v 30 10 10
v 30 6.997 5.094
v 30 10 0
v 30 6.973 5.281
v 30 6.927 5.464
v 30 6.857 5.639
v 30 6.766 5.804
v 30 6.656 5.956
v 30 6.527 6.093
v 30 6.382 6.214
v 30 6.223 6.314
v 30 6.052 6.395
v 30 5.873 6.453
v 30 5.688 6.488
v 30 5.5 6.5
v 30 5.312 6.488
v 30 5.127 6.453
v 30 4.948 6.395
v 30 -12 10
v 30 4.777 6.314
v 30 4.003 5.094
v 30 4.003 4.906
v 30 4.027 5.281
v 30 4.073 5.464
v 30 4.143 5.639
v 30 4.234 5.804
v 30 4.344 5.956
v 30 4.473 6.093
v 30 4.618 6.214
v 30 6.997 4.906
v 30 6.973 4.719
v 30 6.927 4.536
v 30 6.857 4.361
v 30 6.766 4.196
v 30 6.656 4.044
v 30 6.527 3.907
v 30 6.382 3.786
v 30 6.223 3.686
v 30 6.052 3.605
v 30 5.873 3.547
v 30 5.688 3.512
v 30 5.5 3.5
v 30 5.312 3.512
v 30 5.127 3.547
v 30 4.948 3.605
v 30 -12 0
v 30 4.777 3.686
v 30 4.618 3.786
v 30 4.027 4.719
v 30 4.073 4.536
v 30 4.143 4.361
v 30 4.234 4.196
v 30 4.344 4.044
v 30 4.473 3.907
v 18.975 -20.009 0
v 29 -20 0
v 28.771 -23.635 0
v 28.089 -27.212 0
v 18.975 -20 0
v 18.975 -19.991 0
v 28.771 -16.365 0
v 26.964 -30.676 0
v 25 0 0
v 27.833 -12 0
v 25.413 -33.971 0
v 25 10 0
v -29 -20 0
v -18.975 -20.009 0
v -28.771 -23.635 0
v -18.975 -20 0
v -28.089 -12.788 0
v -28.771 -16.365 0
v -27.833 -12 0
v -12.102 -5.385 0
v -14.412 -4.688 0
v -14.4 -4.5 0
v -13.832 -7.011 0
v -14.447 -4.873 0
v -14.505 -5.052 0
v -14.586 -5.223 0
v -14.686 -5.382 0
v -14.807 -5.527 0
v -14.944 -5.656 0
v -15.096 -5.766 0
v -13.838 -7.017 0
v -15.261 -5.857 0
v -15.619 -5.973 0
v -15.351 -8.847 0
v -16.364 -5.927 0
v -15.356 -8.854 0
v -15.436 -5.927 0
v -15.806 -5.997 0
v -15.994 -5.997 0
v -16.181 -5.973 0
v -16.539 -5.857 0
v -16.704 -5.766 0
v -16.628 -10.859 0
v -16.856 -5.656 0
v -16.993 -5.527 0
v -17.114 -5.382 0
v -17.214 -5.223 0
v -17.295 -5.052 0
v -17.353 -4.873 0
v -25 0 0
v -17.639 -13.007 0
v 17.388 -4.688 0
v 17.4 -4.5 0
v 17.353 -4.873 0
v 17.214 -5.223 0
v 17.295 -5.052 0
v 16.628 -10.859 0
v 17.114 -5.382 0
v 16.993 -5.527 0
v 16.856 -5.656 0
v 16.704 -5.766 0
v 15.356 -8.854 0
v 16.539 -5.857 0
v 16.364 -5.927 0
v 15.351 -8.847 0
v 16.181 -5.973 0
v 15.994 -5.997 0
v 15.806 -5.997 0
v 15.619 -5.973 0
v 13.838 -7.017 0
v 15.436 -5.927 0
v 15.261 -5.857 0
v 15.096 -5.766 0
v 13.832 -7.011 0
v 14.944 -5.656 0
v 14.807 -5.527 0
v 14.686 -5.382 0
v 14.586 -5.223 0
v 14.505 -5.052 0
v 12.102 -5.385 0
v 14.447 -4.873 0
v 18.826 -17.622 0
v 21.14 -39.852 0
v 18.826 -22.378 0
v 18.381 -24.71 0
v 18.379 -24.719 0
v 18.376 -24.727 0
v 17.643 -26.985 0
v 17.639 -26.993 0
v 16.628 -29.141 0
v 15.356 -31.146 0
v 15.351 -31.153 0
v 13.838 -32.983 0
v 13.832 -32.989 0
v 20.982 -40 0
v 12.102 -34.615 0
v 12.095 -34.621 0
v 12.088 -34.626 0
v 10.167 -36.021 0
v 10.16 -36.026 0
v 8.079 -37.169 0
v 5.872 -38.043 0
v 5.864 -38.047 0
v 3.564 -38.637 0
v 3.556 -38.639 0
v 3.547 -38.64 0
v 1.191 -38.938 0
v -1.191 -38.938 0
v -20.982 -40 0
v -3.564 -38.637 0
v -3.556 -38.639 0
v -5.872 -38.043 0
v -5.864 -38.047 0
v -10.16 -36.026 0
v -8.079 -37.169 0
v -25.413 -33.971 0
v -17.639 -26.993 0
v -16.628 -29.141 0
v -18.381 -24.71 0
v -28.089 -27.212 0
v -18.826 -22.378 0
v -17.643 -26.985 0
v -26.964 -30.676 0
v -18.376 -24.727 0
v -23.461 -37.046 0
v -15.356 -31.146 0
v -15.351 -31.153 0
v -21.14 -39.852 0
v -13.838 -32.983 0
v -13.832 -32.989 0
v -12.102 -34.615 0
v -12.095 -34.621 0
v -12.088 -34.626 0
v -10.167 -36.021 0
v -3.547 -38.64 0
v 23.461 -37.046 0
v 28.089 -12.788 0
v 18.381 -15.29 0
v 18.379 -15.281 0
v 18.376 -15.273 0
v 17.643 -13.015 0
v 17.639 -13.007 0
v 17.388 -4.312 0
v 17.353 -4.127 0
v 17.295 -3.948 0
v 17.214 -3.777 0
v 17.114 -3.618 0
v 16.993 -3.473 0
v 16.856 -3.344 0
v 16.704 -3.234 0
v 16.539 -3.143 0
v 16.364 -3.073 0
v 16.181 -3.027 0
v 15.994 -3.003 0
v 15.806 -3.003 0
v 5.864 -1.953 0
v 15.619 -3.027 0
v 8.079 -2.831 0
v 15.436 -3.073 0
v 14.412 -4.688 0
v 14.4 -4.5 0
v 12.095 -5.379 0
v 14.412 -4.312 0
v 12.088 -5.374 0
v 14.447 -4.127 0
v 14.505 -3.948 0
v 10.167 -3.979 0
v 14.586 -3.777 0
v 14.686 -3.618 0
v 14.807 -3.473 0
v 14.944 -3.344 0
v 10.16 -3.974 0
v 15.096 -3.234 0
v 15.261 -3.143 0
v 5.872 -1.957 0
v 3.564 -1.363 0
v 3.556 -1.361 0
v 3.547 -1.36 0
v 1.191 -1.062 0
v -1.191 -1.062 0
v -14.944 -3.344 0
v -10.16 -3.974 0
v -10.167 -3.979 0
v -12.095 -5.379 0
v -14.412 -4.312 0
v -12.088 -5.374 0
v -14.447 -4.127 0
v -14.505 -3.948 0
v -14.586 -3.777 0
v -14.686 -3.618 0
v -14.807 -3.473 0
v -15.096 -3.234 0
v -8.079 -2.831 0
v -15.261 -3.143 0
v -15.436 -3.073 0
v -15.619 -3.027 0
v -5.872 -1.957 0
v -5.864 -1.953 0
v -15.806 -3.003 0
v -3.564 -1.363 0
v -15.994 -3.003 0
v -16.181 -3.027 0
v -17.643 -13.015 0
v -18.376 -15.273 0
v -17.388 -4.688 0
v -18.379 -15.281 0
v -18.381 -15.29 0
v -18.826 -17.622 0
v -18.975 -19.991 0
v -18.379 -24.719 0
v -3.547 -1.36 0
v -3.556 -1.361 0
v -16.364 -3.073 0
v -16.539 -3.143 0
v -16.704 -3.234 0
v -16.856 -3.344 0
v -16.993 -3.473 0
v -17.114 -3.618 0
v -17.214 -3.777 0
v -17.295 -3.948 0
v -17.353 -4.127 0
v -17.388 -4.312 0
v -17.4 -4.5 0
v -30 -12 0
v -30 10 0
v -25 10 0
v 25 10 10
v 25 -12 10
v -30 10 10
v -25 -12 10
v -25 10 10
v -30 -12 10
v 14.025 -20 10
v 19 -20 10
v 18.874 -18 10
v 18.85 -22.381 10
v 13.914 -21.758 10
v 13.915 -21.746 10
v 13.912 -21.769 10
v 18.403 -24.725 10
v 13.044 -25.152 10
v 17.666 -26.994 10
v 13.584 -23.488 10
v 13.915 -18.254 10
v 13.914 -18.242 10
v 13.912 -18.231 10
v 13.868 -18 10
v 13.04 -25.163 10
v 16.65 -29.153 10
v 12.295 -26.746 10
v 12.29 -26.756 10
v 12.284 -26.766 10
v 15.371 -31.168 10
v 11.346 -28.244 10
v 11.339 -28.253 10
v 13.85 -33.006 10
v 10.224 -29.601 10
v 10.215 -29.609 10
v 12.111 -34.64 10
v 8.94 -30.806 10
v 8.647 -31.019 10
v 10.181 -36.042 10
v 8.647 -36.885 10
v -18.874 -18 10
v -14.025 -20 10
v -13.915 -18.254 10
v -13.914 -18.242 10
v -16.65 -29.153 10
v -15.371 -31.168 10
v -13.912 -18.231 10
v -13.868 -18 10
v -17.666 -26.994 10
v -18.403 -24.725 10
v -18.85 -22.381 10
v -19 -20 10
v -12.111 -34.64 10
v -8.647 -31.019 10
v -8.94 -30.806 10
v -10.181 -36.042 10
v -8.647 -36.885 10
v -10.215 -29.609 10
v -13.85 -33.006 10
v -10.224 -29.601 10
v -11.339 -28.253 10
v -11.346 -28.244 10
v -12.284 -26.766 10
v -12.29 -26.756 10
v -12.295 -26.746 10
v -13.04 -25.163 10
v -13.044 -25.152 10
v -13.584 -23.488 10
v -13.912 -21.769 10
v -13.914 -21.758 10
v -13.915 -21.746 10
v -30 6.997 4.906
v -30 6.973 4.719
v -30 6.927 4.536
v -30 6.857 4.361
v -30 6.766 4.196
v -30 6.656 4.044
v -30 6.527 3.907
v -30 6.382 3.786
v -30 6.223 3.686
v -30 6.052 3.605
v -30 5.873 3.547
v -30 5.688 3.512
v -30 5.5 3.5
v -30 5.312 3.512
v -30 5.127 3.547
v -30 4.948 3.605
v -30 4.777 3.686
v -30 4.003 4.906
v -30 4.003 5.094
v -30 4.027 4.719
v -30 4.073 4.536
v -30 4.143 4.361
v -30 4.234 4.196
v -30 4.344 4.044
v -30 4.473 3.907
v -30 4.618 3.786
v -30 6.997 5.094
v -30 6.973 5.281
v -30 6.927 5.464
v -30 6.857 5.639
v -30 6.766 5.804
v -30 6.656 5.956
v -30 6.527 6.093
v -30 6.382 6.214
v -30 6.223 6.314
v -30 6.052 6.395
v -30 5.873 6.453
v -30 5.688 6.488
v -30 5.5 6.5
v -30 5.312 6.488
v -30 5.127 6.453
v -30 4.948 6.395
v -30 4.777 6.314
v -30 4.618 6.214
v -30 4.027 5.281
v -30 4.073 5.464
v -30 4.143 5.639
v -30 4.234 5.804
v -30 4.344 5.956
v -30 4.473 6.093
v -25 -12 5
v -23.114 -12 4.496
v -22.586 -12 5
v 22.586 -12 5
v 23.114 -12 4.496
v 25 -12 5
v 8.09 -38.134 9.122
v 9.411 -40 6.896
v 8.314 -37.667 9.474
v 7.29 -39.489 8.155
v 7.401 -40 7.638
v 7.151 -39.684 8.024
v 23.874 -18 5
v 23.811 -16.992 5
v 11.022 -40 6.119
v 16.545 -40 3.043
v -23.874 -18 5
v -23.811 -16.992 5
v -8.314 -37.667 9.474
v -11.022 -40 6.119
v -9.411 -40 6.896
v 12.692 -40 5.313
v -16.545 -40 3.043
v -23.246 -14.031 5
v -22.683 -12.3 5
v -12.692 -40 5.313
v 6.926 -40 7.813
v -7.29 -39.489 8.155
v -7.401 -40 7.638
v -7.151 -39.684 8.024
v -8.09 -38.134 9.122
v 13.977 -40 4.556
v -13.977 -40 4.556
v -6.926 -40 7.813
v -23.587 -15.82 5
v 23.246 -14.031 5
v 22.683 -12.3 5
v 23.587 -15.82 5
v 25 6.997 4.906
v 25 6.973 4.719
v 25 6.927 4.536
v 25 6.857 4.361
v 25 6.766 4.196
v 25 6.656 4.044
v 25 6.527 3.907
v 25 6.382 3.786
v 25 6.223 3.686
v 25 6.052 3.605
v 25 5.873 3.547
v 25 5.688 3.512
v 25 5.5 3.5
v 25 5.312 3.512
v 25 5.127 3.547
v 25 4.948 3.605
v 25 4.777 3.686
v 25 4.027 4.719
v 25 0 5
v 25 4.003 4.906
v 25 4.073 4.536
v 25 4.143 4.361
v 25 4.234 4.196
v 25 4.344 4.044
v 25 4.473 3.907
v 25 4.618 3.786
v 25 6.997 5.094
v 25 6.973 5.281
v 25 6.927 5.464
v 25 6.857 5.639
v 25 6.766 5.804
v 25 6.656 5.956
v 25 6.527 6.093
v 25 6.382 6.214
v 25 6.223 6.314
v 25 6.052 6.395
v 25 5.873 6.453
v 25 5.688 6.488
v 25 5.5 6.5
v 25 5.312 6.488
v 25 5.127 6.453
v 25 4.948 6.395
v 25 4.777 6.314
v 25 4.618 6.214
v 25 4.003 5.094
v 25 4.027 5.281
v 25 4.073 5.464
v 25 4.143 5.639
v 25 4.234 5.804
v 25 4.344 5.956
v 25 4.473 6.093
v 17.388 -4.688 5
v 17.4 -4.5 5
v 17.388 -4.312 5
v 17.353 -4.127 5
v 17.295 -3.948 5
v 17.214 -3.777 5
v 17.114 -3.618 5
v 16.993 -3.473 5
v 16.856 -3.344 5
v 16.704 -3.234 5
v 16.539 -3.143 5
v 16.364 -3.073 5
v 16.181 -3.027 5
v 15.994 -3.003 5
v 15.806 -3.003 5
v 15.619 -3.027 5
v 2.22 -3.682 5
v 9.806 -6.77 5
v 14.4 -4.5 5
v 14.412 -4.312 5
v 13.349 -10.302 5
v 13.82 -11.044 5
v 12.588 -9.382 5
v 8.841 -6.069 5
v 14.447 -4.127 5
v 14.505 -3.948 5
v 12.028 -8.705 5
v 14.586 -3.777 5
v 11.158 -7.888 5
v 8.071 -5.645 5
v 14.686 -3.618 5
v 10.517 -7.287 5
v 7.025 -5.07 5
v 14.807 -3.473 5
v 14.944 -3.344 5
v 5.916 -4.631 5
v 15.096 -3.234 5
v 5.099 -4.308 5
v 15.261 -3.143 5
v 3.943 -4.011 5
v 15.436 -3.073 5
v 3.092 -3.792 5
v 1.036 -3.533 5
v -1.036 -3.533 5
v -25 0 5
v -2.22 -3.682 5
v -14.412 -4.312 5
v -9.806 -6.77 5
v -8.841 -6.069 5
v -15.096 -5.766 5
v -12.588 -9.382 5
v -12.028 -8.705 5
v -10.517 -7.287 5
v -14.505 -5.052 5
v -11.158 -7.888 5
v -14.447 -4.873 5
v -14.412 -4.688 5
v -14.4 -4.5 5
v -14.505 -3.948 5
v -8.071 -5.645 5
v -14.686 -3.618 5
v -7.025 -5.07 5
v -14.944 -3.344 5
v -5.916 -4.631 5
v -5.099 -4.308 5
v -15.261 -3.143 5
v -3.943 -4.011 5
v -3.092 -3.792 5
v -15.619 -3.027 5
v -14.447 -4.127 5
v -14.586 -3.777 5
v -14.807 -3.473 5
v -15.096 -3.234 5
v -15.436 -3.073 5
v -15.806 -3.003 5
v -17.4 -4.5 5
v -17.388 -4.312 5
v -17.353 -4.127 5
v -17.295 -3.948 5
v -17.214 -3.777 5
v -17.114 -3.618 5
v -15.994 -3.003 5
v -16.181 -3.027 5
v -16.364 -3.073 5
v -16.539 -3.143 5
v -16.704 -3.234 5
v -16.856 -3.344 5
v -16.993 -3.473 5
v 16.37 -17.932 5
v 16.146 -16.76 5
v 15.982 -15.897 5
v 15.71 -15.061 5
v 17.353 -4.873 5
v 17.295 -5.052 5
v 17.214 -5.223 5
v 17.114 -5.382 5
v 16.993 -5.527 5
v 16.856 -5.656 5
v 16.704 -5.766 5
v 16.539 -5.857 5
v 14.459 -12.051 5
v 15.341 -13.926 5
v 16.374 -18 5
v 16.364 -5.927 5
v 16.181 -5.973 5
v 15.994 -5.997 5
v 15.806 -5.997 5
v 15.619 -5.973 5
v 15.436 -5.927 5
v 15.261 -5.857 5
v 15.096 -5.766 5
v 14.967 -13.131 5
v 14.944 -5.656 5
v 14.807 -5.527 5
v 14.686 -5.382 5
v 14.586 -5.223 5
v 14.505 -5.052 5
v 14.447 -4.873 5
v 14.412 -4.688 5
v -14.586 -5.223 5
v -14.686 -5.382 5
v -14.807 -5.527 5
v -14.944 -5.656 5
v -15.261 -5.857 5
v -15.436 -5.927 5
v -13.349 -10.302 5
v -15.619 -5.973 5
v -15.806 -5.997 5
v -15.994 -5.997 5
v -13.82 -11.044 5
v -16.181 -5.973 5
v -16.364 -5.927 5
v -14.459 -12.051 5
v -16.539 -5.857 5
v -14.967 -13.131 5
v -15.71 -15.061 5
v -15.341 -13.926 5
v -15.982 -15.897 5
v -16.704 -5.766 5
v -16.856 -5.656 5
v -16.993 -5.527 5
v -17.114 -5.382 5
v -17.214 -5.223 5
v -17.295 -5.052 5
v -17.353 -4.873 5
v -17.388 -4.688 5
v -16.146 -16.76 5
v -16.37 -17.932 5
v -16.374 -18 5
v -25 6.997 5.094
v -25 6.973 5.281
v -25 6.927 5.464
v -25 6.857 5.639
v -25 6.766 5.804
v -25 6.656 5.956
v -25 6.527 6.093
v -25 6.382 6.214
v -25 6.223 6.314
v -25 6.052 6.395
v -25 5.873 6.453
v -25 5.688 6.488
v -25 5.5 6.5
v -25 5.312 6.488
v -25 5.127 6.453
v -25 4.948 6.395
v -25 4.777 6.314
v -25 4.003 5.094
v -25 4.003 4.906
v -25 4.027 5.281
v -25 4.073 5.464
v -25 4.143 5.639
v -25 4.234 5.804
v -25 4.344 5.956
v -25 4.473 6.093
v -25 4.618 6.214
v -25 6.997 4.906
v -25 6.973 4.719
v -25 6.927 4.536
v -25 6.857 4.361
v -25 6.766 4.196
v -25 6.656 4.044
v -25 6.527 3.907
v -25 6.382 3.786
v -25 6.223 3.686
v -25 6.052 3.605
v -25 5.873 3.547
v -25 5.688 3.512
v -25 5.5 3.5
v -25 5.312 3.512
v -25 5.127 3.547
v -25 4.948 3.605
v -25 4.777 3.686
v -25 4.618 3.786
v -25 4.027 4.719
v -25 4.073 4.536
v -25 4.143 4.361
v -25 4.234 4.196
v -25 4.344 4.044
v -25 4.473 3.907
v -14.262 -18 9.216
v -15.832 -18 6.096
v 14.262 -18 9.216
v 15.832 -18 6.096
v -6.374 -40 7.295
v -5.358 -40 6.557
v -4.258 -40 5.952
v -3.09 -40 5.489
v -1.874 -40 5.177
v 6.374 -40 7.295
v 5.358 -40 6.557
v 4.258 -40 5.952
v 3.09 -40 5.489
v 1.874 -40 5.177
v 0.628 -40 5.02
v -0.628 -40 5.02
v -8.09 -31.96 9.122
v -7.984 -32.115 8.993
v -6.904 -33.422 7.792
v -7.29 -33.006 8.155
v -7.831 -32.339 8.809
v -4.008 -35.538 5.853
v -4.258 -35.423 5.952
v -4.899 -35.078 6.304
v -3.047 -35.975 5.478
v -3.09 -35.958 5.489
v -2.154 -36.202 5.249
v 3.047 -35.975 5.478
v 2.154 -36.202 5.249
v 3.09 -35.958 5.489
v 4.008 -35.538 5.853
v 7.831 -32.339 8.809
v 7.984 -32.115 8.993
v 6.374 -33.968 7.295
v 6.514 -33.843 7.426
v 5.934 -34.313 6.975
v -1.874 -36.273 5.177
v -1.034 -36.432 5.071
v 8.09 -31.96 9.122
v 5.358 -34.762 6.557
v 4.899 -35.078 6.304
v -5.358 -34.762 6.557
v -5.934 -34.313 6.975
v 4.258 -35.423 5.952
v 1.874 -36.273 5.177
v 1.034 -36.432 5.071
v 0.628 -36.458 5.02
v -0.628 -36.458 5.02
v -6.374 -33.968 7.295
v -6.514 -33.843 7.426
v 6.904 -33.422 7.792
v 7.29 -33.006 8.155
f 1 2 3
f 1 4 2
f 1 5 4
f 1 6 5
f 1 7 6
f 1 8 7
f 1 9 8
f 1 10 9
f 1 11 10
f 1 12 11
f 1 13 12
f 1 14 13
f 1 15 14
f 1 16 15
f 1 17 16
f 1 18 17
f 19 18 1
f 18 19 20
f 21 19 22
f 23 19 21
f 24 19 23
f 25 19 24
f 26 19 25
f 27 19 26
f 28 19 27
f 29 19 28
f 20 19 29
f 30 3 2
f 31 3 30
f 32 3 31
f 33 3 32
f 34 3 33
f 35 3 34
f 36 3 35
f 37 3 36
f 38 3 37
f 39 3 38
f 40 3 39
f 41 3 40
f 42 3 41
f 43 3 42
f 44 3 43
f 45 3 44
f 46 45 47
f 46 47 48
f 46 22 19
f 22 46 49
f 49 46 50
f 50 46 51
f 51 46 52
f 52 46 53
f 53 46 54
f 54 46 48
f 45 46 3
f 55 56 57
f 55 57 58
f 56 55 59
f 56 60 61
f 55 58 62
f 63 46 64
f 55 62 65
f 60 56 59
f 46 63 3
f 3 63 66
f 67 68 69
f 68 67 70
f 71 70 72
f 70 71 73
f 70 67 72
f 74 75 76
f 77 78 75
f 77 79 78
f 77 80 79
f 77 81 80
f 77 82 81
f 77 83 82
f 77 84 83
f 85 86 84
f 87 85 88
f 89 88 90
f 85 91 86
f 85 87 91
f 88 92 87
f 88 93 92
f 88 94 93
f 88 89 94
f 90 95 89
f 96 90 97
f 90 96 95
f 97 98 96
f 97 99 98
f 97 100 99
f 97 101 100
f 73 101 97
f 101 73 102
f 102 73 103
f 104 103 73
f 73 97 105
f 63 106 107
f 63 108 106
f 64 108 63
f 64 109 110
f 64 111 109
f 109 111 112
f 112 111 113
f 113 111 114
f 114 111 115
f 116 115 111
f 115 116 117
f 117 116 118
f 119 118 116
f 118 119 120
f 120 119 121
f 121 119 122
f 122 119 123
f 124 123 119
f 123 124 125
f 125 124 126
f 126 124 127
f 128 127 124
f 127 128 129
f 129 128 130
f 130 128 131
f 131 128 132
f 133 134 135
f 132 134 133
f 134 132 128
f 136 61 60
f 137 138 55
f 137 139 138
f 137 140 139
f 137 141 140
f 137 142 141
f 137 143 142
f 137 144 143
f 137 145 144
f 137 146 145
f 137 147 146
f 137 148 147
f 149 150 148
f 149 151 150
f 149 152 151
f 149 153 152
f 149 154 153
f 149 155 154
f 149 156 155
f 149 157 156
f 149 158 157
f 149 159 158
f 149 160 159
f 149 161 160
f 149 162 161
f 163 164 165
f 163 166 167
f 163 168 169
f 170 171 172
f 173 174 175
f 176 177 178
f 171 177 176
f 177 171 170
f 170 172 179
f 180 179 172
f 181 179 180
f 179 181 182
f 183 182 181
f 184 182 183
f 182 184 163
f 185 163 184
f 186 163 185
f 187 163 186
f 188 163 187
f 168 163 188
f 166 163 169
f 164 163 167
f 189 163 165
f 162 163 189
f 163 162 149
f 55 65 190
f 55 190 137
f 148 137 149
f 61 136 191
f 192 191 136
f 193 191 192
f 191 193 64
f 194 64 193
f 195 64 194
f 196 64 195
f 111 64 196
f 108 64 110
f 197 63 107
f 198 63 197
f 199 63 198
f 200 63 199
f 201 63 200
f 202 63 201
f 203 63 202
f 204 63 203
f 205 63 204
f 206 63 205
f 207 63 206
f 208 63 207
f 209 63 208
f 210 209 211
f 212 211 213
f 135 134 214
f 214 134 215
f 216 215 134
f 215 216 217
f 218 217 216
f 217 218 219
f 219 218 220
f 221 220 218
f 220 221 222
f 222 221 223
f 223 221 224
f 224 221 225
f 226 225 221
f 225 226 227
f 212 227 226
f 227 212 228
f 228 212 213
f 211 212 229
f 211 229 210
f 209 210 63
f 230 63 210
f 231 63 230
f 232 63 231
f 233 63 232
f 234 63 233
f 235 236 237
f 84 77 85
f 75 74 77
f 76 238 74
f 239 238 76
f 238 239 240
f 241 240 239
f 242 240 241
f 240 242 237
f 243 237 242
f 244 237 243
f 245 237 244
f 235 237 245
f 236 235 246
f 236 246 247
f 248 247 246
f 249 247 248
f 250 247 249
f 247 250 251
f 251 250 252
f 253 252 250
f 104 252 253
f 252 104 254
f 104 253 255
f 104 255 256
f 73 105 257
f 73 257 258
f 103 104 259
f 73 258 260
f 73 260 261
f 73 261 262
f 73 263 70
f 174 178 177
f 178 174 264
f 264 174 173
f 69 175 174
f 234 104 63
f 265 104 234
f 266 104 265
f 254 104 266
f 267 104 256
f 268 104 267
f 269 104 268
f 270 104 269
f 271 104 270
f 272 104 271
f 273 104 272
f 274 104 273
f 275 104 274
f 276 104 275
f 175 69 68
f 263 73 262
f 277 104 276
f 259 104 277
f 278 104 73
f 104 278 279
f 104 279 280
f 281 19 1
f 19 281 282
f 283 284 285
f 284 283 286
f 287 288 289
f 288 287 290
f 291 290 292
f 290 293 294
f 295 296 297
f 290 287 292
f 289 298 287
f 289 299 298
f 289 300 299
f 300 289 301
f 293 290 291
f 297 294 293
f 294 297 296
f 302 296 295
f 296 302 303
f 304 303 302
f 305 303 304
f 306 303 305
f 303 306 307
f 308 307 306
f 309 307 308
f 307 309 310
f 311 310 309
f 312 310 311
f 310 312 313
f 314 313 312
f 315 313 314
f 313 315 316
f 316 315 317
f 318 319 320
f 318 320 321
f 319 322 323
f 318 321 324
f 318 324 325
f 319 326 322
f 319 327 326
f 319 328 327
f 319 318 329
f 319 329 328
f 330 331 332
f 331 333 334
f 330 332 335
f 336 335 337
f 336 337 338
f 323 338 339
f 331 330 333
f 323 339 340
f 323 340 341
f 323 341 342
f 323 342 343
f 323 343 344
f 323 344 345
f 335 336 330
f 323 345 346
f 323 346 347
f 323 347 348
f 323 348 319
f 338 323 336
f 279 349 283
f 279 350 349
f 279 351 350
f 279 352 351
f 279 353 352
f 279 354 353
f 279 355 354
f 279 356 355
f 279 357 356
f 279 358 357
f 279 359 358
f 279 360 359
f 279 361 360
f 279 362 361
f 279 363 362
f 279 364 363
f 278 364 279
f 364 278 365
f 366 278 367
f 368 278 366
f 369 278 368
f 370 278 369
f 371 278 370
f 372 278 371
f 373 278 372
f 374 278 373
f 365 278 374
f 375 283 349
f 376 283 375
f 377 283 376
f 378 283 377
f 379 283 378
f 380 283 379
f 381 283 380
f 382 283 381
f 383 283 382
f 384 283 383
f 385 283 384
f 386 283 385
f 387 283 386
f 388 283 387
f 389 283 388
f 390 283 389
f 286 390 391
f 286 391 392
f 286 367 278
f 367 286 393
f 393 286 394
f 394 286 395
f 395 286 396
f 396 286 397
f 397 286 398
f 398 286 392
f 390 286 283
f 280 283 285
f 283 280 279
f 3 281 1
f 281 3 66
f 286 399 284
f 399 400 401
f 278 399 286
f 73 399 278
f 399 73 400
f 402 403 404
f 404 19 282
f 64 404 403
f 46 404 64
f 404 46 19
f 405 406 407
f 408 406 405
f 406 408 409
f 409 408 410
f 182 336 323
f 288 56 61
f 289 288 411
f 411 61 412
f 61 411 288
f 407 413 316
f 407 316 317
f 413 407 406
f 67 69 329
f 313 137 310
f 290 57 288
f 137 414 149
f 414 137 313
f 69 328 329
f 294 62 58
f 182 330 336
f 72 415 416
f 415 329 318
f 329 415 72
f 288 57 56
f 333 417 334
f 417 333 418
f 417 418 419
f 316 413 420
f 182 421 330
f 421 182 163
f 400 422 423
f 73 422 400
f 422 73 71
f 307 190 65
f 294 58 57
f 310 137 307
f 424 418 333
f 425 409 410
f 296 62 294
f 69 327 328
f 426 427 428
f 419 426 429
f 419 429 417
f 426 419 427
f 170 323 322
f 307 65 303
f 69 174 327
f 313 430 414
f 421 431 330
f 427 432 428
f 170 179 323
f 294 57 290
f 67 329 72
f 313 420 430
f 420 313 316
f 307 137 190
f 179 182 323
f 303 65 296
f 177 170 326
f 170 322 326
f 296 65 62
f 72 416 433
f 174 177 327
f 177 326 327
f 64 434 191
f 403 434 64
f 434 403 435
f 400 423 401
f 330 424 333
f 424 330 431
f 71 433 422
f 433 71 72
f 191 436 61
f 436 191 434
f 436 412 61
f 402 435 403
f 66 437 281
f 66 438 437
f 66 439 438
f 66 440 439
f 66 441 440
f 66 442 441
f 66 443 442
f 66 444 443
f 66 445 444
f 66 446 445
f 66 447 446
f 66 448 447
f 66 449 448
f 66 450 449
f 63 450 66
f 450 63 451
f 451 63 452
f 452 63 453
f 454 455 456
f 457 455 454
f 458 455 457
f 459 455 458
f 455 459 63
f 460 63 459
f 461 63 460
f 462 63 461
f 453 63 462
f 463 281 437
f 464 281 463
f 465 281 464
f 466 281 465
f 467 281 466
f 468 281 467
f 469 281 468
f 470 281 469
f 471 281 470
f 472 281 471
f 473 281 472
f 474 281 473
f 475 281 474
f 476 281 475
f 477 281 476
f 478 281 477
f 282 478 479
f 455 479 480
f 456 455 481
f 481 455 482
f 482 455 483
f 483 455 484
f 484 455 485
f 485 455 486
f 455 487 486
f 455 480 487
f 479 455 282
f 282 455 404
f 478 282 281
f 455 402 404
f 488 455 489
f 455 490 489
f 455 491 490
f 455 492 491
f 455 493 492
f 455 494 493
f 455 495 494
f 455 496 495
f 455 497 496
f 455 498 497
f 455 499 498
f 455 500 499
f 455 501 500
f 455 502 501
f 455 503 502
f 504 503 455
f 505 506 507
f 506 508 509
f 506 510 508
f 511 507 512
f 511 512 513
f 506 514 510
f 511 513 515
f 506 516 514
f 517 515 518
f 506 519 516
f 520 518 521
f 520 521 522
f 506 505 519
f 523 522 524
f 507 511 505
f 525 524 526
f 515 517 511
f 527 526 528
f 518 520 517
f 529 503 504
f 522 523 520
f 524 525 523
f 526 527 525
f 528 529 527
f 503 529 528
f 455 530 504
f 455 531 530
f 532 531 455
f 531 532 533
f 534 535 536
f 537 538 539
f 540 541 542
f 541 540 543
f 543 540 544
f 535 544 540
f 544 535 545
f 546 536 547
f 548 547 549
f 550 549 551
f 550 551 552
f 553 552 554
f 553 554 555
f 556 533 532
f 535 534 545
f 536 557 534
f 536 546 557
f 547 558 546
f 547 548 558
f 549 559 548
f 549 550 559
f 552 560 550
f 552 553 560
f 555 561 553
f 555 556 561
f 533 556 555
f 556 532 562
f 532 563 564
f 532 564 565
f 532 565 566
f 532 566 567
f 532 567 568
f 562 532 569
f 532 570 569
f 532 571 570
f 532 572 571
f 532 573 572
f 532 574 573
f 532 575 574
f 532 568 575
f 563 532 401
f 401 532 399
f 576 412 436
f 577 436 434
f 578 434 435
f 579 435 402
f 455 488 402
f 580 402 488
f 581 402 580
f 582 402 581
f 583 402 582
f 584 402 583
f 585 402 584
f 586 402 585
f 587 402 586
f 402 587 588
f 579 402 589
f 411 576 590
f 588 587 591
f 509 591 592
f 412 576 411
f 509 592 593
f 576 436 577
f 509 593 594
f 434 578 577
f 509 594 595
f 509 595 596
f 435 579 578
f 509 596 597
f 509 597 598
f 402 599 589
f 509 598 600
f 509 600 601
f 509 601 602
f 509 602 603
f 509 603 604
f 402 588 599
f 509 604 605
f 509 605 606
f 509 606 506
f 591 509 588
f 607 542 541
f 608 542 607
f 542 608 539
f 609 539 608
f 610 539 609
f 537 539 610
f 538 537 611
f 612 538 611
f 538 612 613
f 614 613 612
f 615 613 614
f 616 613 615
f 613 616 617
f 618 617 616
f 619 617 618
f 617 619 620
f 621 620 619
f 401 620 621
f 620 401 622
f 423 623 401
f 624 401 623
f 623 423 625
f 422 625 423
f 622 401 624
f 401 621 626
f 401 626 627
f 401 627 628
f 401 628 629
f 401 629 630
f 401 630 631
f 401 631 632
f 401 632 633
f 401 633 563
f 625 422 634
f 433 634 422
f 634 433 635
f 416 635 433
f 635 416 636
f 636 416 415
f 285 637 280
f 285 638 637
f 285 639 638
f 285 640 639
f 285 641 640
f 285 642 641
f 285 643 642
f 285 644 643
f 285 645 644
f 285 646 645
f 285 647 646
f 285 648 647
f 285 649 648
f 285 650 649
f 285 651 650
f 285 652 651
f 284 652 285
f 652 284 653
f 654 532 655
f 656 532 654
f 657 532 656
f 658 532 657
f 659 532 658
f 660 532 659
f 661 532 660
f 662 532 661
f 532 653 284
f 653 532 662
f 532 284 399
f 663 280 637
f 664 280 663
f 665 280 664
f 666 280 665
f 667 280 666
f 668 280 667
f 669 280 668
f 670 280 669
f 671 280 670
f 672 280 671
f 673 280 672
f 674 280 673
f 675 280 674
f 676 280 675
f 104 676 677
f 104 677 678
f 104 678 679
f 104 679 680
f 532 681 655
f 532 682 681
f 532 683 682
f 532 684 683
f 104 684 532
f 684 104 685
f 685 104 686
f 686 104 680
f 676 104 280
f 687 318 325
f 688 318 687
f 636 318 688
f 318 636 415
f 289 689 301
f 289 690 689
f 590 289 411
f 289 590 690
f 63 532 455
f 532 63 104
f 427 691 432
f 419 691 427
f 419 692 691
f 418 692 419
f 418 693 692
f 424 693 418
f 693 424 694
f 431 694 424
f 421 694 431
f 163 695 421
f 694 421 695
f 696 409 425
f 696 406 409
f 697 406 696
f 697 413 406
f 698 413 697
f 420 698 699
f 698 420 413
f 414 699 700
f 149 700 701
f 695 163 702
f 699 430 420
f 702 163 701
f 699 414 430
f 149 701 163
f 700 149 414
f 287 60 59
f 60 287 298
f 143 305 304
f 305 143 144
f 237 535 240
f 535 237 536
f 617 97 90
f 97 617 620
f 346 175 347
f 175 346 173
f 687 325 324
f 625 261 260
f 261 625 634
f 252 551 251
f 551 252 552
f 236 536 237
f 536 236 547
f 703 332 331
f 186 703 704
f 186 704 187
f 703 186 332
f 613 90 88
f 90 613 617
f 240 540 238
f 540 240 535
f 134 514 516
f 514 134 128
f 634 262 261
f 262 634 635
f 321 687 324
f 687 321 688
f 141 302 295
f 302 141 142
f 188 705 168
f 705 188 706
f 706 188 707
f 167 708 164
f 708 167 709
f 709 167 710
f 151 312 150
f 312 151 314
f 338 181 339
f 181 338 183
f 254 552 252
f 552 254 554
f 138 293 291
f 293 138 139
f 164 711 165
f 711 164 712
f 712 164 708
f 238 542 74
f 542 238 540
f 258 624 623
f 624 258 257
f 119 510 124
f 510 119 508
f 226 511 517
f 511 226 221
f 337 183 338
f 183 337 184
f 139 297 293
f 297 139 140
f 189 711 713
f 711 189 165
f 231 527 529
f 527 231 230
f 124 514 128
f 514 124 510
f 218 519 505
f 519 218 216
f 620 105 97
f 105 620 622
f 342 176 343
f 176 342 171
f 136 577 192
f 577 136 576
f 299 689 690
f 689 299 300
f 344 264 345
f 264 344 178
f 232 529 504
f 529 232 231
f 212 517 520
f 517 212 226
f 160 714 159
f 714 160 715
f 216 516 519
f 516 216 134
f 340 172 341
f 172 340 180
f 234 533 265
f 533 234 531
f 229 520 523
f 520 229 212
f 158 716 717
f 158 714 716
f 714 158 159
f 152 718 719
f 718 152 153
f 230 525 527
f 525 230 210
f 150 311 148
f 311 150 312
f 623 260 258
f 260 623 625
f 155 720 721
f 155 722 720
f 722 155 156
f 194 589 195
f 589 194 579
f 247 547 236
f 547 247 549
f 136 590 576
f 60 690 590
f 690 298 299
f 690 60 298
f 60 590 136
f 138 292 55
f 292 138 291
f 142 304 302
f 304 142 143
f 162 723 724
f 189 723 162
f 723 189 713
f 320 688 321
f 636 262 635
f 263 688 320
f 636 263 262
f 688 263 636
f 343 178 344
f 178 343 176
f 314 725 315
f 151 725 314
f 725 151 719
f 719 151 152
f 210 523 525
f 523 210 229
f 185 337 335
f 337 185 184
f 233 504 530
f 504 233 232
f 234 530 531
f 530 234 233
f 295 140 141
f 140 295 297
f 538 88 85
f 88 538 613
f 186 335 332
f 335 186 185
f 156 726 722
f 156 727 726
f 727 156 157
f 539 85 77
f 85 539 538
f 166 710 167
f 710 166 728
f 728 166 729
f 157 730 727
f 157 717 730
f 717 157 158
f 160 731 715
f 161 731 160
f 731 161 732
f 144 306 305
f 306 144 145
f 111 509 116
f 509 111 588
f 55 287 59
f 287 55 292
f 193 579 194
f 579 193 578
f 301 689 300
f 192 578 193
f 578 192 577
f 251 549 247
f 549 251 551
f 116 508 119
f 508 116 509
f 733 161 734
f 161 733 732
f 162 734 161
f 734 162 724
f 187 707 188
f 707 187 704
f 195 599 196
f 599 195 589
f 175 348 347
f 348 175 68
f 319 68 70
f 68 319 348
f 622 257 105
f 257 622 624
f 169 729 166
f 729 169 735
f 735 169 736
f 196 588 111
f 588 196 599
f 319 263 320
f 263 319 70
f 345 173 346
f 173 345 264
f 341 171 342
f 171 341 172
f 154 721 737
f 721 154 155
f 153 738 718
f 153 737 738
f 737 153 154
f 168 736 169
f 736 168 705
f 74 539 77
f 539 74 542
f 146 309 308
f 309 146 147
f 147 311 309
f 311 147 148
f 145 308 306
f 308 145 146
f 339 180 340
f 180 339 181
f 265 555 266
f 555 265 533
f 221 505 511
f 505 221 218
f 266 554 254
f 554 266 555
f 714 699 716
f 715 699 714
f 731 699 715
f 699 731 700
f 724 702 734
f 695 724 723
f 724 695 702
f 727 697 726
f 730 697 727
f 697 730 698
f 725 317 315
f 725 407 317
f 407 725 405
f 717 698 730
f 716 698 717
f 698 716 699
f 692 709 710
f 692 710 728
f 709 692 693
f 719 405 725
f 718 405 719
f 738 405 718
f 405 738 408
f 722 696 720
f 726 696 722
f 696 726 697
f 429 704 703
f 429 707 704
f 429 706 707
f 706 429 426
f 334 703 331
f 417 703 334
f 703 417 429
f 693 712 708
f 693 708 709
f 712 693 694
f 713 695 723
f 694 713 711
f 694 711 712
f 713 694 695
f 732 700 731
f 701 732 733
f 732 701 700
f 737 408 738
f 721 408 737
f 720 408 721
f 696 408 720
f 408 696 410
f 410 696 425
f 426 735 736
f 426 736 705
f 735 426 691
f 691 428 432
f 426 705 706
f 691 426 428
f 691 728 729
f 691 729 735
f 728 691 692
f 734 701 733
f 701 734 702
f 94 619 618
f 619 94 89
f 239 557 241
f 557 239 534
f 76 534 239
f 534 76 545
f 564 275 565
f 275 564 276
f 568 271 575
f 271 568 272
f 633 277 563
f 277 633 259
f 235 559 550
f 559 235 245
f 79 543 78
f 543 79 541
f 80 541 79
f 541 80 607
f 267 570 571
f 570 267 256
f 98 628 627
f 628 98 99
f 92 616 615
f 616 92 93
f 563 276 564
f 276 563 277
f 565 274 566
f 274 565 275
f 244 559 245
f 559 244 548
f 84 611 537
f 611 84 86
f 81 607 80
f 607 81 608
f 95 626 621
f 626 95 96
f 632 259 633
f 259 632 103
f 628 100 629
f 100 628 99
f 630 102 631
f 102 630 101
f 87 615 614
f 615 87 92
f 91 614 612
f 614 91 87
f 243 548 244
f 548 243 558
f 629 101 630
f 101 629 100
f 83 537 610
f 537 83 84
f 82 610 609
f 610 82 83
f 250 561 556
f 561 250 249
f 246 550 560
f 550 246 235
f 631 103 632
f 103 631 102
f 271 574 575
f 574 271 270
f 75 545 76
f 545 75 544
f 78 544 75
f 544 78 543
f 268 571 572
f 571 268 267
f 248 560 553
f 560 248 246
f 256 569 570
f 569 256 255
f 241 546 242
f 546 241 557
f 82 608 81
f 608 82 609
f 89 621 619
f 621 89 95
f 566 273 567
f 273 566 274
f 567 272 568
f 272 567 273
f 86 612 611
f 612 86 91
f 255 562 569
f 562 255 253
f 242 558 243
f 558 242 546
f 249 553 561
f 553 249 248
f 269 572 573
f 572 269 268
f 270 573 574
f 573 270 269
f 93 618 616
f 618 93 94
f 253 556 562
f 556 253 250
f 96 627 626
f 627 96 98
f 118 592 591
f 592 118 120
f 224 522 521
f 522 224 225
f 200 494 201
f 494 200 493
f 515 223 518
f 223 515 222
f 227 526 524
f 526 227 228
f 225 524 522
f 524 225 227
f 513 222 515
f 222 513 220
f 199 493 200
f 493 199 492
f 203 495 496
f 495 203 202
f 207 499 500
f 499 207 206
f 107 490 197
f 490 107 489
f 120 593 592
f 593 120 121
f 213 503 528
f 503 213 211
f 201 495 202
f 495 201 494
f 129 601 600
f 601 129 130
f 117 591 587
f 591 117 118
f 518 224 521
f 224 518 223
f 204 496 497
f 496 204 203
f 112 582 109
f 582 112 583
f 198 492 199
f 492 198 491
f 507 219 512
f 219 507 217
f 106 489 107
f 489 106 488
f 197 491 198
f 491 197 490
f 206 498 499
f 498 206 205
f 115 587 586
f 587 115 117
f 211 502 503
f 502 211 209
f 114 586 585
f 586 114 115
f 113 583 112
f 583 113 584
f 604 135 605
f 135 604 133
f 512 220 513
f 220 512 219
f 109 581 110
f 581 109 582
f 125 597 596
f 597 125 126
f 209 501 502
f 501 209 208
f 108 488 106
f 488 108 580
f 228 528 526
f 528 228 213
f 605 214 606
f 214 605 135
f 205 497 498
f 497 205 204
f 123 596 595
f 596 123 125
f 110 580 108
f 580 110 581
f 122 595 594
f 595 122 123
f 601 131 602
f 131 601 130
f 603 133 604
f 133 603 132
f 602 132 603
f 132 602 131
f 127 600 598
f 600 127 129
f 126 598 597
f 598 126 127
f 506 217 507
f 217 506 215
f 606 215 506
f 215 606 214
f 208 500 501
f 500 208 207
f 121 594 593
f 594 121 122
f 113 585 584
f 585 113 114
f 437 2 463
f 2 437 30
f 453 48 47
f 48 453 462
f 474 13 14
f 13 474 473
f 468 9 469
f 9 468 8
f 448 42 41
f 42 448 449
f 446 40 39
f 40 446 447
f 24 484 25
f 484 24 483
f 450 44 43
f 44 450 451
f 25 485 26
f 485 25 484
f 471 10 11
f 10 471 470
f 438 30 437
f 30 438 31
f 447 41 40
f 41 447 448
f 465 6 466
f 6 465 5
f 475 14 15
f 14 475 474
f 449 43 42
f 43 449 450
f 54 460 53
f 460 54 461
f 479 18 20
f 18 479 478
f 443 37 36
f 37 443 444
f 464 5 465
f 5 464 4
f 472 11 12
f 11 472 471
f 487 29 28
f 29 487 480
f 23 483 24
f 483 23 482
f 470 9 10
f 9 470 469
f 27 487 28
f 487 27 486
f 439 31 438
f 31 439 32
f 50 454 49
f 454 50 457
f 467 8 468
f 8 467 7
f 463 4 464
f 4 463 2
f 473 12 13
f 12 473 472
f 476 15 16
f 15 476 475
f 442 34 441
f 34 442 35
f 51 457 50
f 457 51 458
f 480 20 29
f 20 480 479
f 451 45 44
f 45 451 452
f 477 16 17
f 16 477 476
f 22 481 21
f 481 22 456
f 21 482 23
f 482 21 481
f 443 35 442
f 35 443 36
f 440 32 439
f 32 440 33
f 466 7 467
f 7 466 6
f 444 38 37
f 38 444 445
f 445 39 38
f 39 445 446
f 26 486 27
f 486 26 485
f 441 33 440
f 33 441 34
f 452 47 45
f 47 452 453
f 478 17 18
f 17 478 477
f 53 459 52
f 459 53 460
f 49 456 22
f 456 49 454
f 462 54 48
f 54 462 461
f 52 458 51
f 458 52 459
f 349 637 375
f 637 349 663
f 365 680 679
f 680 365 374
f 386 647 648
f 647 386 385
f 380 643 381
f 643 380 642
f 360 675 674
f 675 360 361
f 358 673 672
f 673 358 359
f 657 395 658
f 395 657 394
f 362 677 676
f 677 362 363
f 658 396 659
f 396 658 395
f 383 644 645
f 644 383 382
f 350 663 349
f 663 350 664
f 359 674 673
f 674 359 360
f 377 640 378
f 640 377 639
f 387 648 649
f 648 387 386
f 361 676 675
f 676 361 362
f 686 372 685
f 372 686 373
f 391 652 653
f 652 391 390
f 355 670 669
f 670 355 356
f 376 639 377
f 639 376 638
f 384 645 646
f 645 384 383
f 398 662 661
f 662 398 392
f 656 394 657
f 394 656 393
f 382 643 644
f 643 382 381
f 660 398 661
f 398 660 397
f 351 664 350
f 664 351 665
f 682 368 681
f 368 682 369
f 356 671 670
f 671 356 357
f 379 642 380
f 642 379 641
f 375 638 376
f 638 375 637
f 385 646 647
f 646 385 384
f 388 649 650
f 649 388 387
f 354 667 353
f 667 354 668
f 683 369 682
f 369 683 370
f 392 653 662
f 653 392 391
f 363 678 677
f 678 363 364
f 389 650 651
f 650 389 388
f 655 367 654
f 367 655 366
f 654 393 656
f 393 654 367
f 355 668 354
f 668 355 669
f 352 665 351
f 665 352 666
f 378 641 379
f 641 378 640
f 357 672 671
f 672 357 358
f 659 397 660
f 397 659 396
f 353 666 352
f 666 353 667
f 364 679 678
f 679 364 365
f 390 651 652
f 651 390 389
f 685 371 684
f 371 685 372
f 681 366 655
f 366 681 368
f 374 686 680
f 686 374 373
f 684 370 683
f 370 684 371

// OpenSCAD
fanEdgeLength = 40;
fanDepth = 10;
fanDiameter = 38;

$fn=50;

module fan (edgeLength, depth, diameter) {
	
	screwHoleDiameter = 3;
	screwHoleOffset = 3;
	
	module screwhole () {
			translate([
 				screwHoleDiameter/2 + screwHoleOffset,
 				screwHoleDiameter/2 + screwHoleOffset,
 				-(depth * 0.5),
 			])
			cylinder(d=screwHoleDiameter, h= 2 * depth);
	}
	
	difference (){
		cube([edgeLength, edgeLength, depth]);


		// Screwholes
		screwhole();
		
		translate([edgeLength,0,0])
		mirror([1, 0, 0])
		screwhole();
		
		translate([0,edgeLength,0])
		mirror([0, 1, 0])
		screwhole();
		
		translate([edgeLength,edgeLength,0])
		mirror([1, 1, 0])
		screwhole();
		
		translate([edgeLength/2, edgeLength/2, -(depth * 0.5)])
		cylinder(d=diameter, h=(2 * depth));
	}
}



module mount (fanEdgeLength, fanDepth, fanDiameter) {
	
	bridgeHeigth = 12;
	bridgeWidth = 60;
	bridgeDepth = 5;
	hornHeight = 10;
	

	screwHoleDiameter = 3;
	screwHoleOffset = 3;
	
	nutHeight = 7;
	nutDepth = 3;
	nutWidth = 6;
	
	inaccuracyCorrection = 0.4;

	// Printer-part
	/*
	color([0, 0, 0]) {
 		translate([-bridgeWidth/2, -bridgeHeigth*1.2, -bridgeDepth*2])
 		cube(size=[bridgeWidth, bridgeHeigth * 1.2, bridgeDepth*2], center=false);
	}
	*/
	
	
	difference () {
		
		union(){
			// Bridge
			translate([0, -bridgeHeigth/2 + hornHeight/2, 0])
			cube(size=[bridgeWidth, bridgeHeigth + hornHeight, bridgeDepth * 2], center=true);
			
			// Outer cylinder
			translate([0,-fanEdgeLength/2,0])
			cylinder(d1=fanDiameter, d2=fanDiameter + 20, h=10, center=true);
		}
		
		// Cutoffs
		union(){
			translate([0, 0, -bridgeDepth])
			cube(size=[bridgeWidth - 2 * bridgeDepth, 18 * 2, bridgeDepth * 2], center=true);

			translate([0, bridgeHeigth, 0])
			cube(size=[fanEdgeLength + 10, bridgeHeigth * 2, bridgeDepth*4], center=true);
			
			translate([0, -fanEdgeLength - bridgeHeigth, 0])
			cube(size=[bridgeWidth*2, bridgeHeigth * 2, bridgeDepth*4], center=true);
		}
		
		// Inner cylinder
		translate([0,-fanEdgeLength/2,0])
		cylinder(d1=(fanDiameter-10), d2=fanDiameter, h=10.1, center=true);
		
		// Recess
		translate([0,0,-10])
		rotate([90,0,0])
		cylinder(r=10, h=100, center=true);
		
		// Baseplate screwholes
		translate([
			-fanEdgeLength/2 + screwHoleOffset + screwHoleDiameter/2 - inaccuracyCorrection,
			-screwHoleOffset - screwHoleDiameter/2,
			0
		])
		cylinder(d=3, h=20, center=true);
		
		translate([
			fanEdgeLength/2 - screwHoleOffset - screwHoleDiameter/2 + inaccuracyCorrection,
			-screwHoleOffset - screwHoleDiameter/2,
			0
		])
		cylinder(d=3, h=20, center=true);
		
		// Fans screwholes
		translate([
			fanEdgeLength/2,
			-screwHoleOffset - screwHoleDiameter/2 + hornHeight,
			0
		])
		rotate([0,90,0])
		cylinder(d=3, h=20);
		
		translate([
			-fanEdgeLength/2 - 20,
			-screwHoleOffset - screwHoleDiameter/2 + hornHeight,
			0
		])
		rotate([0,90,0])
		cylinder(d=3, h=20);

		// Nuts recesses
		/*translate([
			bridgeWidth/2 - bridgeDepth - nutDepth/2,
			-screwHoleOffset - screwHoleDiameter/2,
			0
		])
		cube(size=[nutDepth, nutWidth, nutHeight], center=true);
		
		translate([
			- bridgeWidth/2 + bridgeDepth + nutDepth/2,
			-screwHoleOffset - screwHoleDiameter/2,
			0
		])
		cube(size=[nutDepth, nutWidth, nutHeight], center=true);
		*/
	}
}

translate([0,0,5])
mirror([0,0,1]){
	*translate([-20,-40,5])
	fan(fanEdgeLength, fanDepth, fanDiameter);
	
	mount(fanEdgeLength, fanDepth, fanDiameter);
}
